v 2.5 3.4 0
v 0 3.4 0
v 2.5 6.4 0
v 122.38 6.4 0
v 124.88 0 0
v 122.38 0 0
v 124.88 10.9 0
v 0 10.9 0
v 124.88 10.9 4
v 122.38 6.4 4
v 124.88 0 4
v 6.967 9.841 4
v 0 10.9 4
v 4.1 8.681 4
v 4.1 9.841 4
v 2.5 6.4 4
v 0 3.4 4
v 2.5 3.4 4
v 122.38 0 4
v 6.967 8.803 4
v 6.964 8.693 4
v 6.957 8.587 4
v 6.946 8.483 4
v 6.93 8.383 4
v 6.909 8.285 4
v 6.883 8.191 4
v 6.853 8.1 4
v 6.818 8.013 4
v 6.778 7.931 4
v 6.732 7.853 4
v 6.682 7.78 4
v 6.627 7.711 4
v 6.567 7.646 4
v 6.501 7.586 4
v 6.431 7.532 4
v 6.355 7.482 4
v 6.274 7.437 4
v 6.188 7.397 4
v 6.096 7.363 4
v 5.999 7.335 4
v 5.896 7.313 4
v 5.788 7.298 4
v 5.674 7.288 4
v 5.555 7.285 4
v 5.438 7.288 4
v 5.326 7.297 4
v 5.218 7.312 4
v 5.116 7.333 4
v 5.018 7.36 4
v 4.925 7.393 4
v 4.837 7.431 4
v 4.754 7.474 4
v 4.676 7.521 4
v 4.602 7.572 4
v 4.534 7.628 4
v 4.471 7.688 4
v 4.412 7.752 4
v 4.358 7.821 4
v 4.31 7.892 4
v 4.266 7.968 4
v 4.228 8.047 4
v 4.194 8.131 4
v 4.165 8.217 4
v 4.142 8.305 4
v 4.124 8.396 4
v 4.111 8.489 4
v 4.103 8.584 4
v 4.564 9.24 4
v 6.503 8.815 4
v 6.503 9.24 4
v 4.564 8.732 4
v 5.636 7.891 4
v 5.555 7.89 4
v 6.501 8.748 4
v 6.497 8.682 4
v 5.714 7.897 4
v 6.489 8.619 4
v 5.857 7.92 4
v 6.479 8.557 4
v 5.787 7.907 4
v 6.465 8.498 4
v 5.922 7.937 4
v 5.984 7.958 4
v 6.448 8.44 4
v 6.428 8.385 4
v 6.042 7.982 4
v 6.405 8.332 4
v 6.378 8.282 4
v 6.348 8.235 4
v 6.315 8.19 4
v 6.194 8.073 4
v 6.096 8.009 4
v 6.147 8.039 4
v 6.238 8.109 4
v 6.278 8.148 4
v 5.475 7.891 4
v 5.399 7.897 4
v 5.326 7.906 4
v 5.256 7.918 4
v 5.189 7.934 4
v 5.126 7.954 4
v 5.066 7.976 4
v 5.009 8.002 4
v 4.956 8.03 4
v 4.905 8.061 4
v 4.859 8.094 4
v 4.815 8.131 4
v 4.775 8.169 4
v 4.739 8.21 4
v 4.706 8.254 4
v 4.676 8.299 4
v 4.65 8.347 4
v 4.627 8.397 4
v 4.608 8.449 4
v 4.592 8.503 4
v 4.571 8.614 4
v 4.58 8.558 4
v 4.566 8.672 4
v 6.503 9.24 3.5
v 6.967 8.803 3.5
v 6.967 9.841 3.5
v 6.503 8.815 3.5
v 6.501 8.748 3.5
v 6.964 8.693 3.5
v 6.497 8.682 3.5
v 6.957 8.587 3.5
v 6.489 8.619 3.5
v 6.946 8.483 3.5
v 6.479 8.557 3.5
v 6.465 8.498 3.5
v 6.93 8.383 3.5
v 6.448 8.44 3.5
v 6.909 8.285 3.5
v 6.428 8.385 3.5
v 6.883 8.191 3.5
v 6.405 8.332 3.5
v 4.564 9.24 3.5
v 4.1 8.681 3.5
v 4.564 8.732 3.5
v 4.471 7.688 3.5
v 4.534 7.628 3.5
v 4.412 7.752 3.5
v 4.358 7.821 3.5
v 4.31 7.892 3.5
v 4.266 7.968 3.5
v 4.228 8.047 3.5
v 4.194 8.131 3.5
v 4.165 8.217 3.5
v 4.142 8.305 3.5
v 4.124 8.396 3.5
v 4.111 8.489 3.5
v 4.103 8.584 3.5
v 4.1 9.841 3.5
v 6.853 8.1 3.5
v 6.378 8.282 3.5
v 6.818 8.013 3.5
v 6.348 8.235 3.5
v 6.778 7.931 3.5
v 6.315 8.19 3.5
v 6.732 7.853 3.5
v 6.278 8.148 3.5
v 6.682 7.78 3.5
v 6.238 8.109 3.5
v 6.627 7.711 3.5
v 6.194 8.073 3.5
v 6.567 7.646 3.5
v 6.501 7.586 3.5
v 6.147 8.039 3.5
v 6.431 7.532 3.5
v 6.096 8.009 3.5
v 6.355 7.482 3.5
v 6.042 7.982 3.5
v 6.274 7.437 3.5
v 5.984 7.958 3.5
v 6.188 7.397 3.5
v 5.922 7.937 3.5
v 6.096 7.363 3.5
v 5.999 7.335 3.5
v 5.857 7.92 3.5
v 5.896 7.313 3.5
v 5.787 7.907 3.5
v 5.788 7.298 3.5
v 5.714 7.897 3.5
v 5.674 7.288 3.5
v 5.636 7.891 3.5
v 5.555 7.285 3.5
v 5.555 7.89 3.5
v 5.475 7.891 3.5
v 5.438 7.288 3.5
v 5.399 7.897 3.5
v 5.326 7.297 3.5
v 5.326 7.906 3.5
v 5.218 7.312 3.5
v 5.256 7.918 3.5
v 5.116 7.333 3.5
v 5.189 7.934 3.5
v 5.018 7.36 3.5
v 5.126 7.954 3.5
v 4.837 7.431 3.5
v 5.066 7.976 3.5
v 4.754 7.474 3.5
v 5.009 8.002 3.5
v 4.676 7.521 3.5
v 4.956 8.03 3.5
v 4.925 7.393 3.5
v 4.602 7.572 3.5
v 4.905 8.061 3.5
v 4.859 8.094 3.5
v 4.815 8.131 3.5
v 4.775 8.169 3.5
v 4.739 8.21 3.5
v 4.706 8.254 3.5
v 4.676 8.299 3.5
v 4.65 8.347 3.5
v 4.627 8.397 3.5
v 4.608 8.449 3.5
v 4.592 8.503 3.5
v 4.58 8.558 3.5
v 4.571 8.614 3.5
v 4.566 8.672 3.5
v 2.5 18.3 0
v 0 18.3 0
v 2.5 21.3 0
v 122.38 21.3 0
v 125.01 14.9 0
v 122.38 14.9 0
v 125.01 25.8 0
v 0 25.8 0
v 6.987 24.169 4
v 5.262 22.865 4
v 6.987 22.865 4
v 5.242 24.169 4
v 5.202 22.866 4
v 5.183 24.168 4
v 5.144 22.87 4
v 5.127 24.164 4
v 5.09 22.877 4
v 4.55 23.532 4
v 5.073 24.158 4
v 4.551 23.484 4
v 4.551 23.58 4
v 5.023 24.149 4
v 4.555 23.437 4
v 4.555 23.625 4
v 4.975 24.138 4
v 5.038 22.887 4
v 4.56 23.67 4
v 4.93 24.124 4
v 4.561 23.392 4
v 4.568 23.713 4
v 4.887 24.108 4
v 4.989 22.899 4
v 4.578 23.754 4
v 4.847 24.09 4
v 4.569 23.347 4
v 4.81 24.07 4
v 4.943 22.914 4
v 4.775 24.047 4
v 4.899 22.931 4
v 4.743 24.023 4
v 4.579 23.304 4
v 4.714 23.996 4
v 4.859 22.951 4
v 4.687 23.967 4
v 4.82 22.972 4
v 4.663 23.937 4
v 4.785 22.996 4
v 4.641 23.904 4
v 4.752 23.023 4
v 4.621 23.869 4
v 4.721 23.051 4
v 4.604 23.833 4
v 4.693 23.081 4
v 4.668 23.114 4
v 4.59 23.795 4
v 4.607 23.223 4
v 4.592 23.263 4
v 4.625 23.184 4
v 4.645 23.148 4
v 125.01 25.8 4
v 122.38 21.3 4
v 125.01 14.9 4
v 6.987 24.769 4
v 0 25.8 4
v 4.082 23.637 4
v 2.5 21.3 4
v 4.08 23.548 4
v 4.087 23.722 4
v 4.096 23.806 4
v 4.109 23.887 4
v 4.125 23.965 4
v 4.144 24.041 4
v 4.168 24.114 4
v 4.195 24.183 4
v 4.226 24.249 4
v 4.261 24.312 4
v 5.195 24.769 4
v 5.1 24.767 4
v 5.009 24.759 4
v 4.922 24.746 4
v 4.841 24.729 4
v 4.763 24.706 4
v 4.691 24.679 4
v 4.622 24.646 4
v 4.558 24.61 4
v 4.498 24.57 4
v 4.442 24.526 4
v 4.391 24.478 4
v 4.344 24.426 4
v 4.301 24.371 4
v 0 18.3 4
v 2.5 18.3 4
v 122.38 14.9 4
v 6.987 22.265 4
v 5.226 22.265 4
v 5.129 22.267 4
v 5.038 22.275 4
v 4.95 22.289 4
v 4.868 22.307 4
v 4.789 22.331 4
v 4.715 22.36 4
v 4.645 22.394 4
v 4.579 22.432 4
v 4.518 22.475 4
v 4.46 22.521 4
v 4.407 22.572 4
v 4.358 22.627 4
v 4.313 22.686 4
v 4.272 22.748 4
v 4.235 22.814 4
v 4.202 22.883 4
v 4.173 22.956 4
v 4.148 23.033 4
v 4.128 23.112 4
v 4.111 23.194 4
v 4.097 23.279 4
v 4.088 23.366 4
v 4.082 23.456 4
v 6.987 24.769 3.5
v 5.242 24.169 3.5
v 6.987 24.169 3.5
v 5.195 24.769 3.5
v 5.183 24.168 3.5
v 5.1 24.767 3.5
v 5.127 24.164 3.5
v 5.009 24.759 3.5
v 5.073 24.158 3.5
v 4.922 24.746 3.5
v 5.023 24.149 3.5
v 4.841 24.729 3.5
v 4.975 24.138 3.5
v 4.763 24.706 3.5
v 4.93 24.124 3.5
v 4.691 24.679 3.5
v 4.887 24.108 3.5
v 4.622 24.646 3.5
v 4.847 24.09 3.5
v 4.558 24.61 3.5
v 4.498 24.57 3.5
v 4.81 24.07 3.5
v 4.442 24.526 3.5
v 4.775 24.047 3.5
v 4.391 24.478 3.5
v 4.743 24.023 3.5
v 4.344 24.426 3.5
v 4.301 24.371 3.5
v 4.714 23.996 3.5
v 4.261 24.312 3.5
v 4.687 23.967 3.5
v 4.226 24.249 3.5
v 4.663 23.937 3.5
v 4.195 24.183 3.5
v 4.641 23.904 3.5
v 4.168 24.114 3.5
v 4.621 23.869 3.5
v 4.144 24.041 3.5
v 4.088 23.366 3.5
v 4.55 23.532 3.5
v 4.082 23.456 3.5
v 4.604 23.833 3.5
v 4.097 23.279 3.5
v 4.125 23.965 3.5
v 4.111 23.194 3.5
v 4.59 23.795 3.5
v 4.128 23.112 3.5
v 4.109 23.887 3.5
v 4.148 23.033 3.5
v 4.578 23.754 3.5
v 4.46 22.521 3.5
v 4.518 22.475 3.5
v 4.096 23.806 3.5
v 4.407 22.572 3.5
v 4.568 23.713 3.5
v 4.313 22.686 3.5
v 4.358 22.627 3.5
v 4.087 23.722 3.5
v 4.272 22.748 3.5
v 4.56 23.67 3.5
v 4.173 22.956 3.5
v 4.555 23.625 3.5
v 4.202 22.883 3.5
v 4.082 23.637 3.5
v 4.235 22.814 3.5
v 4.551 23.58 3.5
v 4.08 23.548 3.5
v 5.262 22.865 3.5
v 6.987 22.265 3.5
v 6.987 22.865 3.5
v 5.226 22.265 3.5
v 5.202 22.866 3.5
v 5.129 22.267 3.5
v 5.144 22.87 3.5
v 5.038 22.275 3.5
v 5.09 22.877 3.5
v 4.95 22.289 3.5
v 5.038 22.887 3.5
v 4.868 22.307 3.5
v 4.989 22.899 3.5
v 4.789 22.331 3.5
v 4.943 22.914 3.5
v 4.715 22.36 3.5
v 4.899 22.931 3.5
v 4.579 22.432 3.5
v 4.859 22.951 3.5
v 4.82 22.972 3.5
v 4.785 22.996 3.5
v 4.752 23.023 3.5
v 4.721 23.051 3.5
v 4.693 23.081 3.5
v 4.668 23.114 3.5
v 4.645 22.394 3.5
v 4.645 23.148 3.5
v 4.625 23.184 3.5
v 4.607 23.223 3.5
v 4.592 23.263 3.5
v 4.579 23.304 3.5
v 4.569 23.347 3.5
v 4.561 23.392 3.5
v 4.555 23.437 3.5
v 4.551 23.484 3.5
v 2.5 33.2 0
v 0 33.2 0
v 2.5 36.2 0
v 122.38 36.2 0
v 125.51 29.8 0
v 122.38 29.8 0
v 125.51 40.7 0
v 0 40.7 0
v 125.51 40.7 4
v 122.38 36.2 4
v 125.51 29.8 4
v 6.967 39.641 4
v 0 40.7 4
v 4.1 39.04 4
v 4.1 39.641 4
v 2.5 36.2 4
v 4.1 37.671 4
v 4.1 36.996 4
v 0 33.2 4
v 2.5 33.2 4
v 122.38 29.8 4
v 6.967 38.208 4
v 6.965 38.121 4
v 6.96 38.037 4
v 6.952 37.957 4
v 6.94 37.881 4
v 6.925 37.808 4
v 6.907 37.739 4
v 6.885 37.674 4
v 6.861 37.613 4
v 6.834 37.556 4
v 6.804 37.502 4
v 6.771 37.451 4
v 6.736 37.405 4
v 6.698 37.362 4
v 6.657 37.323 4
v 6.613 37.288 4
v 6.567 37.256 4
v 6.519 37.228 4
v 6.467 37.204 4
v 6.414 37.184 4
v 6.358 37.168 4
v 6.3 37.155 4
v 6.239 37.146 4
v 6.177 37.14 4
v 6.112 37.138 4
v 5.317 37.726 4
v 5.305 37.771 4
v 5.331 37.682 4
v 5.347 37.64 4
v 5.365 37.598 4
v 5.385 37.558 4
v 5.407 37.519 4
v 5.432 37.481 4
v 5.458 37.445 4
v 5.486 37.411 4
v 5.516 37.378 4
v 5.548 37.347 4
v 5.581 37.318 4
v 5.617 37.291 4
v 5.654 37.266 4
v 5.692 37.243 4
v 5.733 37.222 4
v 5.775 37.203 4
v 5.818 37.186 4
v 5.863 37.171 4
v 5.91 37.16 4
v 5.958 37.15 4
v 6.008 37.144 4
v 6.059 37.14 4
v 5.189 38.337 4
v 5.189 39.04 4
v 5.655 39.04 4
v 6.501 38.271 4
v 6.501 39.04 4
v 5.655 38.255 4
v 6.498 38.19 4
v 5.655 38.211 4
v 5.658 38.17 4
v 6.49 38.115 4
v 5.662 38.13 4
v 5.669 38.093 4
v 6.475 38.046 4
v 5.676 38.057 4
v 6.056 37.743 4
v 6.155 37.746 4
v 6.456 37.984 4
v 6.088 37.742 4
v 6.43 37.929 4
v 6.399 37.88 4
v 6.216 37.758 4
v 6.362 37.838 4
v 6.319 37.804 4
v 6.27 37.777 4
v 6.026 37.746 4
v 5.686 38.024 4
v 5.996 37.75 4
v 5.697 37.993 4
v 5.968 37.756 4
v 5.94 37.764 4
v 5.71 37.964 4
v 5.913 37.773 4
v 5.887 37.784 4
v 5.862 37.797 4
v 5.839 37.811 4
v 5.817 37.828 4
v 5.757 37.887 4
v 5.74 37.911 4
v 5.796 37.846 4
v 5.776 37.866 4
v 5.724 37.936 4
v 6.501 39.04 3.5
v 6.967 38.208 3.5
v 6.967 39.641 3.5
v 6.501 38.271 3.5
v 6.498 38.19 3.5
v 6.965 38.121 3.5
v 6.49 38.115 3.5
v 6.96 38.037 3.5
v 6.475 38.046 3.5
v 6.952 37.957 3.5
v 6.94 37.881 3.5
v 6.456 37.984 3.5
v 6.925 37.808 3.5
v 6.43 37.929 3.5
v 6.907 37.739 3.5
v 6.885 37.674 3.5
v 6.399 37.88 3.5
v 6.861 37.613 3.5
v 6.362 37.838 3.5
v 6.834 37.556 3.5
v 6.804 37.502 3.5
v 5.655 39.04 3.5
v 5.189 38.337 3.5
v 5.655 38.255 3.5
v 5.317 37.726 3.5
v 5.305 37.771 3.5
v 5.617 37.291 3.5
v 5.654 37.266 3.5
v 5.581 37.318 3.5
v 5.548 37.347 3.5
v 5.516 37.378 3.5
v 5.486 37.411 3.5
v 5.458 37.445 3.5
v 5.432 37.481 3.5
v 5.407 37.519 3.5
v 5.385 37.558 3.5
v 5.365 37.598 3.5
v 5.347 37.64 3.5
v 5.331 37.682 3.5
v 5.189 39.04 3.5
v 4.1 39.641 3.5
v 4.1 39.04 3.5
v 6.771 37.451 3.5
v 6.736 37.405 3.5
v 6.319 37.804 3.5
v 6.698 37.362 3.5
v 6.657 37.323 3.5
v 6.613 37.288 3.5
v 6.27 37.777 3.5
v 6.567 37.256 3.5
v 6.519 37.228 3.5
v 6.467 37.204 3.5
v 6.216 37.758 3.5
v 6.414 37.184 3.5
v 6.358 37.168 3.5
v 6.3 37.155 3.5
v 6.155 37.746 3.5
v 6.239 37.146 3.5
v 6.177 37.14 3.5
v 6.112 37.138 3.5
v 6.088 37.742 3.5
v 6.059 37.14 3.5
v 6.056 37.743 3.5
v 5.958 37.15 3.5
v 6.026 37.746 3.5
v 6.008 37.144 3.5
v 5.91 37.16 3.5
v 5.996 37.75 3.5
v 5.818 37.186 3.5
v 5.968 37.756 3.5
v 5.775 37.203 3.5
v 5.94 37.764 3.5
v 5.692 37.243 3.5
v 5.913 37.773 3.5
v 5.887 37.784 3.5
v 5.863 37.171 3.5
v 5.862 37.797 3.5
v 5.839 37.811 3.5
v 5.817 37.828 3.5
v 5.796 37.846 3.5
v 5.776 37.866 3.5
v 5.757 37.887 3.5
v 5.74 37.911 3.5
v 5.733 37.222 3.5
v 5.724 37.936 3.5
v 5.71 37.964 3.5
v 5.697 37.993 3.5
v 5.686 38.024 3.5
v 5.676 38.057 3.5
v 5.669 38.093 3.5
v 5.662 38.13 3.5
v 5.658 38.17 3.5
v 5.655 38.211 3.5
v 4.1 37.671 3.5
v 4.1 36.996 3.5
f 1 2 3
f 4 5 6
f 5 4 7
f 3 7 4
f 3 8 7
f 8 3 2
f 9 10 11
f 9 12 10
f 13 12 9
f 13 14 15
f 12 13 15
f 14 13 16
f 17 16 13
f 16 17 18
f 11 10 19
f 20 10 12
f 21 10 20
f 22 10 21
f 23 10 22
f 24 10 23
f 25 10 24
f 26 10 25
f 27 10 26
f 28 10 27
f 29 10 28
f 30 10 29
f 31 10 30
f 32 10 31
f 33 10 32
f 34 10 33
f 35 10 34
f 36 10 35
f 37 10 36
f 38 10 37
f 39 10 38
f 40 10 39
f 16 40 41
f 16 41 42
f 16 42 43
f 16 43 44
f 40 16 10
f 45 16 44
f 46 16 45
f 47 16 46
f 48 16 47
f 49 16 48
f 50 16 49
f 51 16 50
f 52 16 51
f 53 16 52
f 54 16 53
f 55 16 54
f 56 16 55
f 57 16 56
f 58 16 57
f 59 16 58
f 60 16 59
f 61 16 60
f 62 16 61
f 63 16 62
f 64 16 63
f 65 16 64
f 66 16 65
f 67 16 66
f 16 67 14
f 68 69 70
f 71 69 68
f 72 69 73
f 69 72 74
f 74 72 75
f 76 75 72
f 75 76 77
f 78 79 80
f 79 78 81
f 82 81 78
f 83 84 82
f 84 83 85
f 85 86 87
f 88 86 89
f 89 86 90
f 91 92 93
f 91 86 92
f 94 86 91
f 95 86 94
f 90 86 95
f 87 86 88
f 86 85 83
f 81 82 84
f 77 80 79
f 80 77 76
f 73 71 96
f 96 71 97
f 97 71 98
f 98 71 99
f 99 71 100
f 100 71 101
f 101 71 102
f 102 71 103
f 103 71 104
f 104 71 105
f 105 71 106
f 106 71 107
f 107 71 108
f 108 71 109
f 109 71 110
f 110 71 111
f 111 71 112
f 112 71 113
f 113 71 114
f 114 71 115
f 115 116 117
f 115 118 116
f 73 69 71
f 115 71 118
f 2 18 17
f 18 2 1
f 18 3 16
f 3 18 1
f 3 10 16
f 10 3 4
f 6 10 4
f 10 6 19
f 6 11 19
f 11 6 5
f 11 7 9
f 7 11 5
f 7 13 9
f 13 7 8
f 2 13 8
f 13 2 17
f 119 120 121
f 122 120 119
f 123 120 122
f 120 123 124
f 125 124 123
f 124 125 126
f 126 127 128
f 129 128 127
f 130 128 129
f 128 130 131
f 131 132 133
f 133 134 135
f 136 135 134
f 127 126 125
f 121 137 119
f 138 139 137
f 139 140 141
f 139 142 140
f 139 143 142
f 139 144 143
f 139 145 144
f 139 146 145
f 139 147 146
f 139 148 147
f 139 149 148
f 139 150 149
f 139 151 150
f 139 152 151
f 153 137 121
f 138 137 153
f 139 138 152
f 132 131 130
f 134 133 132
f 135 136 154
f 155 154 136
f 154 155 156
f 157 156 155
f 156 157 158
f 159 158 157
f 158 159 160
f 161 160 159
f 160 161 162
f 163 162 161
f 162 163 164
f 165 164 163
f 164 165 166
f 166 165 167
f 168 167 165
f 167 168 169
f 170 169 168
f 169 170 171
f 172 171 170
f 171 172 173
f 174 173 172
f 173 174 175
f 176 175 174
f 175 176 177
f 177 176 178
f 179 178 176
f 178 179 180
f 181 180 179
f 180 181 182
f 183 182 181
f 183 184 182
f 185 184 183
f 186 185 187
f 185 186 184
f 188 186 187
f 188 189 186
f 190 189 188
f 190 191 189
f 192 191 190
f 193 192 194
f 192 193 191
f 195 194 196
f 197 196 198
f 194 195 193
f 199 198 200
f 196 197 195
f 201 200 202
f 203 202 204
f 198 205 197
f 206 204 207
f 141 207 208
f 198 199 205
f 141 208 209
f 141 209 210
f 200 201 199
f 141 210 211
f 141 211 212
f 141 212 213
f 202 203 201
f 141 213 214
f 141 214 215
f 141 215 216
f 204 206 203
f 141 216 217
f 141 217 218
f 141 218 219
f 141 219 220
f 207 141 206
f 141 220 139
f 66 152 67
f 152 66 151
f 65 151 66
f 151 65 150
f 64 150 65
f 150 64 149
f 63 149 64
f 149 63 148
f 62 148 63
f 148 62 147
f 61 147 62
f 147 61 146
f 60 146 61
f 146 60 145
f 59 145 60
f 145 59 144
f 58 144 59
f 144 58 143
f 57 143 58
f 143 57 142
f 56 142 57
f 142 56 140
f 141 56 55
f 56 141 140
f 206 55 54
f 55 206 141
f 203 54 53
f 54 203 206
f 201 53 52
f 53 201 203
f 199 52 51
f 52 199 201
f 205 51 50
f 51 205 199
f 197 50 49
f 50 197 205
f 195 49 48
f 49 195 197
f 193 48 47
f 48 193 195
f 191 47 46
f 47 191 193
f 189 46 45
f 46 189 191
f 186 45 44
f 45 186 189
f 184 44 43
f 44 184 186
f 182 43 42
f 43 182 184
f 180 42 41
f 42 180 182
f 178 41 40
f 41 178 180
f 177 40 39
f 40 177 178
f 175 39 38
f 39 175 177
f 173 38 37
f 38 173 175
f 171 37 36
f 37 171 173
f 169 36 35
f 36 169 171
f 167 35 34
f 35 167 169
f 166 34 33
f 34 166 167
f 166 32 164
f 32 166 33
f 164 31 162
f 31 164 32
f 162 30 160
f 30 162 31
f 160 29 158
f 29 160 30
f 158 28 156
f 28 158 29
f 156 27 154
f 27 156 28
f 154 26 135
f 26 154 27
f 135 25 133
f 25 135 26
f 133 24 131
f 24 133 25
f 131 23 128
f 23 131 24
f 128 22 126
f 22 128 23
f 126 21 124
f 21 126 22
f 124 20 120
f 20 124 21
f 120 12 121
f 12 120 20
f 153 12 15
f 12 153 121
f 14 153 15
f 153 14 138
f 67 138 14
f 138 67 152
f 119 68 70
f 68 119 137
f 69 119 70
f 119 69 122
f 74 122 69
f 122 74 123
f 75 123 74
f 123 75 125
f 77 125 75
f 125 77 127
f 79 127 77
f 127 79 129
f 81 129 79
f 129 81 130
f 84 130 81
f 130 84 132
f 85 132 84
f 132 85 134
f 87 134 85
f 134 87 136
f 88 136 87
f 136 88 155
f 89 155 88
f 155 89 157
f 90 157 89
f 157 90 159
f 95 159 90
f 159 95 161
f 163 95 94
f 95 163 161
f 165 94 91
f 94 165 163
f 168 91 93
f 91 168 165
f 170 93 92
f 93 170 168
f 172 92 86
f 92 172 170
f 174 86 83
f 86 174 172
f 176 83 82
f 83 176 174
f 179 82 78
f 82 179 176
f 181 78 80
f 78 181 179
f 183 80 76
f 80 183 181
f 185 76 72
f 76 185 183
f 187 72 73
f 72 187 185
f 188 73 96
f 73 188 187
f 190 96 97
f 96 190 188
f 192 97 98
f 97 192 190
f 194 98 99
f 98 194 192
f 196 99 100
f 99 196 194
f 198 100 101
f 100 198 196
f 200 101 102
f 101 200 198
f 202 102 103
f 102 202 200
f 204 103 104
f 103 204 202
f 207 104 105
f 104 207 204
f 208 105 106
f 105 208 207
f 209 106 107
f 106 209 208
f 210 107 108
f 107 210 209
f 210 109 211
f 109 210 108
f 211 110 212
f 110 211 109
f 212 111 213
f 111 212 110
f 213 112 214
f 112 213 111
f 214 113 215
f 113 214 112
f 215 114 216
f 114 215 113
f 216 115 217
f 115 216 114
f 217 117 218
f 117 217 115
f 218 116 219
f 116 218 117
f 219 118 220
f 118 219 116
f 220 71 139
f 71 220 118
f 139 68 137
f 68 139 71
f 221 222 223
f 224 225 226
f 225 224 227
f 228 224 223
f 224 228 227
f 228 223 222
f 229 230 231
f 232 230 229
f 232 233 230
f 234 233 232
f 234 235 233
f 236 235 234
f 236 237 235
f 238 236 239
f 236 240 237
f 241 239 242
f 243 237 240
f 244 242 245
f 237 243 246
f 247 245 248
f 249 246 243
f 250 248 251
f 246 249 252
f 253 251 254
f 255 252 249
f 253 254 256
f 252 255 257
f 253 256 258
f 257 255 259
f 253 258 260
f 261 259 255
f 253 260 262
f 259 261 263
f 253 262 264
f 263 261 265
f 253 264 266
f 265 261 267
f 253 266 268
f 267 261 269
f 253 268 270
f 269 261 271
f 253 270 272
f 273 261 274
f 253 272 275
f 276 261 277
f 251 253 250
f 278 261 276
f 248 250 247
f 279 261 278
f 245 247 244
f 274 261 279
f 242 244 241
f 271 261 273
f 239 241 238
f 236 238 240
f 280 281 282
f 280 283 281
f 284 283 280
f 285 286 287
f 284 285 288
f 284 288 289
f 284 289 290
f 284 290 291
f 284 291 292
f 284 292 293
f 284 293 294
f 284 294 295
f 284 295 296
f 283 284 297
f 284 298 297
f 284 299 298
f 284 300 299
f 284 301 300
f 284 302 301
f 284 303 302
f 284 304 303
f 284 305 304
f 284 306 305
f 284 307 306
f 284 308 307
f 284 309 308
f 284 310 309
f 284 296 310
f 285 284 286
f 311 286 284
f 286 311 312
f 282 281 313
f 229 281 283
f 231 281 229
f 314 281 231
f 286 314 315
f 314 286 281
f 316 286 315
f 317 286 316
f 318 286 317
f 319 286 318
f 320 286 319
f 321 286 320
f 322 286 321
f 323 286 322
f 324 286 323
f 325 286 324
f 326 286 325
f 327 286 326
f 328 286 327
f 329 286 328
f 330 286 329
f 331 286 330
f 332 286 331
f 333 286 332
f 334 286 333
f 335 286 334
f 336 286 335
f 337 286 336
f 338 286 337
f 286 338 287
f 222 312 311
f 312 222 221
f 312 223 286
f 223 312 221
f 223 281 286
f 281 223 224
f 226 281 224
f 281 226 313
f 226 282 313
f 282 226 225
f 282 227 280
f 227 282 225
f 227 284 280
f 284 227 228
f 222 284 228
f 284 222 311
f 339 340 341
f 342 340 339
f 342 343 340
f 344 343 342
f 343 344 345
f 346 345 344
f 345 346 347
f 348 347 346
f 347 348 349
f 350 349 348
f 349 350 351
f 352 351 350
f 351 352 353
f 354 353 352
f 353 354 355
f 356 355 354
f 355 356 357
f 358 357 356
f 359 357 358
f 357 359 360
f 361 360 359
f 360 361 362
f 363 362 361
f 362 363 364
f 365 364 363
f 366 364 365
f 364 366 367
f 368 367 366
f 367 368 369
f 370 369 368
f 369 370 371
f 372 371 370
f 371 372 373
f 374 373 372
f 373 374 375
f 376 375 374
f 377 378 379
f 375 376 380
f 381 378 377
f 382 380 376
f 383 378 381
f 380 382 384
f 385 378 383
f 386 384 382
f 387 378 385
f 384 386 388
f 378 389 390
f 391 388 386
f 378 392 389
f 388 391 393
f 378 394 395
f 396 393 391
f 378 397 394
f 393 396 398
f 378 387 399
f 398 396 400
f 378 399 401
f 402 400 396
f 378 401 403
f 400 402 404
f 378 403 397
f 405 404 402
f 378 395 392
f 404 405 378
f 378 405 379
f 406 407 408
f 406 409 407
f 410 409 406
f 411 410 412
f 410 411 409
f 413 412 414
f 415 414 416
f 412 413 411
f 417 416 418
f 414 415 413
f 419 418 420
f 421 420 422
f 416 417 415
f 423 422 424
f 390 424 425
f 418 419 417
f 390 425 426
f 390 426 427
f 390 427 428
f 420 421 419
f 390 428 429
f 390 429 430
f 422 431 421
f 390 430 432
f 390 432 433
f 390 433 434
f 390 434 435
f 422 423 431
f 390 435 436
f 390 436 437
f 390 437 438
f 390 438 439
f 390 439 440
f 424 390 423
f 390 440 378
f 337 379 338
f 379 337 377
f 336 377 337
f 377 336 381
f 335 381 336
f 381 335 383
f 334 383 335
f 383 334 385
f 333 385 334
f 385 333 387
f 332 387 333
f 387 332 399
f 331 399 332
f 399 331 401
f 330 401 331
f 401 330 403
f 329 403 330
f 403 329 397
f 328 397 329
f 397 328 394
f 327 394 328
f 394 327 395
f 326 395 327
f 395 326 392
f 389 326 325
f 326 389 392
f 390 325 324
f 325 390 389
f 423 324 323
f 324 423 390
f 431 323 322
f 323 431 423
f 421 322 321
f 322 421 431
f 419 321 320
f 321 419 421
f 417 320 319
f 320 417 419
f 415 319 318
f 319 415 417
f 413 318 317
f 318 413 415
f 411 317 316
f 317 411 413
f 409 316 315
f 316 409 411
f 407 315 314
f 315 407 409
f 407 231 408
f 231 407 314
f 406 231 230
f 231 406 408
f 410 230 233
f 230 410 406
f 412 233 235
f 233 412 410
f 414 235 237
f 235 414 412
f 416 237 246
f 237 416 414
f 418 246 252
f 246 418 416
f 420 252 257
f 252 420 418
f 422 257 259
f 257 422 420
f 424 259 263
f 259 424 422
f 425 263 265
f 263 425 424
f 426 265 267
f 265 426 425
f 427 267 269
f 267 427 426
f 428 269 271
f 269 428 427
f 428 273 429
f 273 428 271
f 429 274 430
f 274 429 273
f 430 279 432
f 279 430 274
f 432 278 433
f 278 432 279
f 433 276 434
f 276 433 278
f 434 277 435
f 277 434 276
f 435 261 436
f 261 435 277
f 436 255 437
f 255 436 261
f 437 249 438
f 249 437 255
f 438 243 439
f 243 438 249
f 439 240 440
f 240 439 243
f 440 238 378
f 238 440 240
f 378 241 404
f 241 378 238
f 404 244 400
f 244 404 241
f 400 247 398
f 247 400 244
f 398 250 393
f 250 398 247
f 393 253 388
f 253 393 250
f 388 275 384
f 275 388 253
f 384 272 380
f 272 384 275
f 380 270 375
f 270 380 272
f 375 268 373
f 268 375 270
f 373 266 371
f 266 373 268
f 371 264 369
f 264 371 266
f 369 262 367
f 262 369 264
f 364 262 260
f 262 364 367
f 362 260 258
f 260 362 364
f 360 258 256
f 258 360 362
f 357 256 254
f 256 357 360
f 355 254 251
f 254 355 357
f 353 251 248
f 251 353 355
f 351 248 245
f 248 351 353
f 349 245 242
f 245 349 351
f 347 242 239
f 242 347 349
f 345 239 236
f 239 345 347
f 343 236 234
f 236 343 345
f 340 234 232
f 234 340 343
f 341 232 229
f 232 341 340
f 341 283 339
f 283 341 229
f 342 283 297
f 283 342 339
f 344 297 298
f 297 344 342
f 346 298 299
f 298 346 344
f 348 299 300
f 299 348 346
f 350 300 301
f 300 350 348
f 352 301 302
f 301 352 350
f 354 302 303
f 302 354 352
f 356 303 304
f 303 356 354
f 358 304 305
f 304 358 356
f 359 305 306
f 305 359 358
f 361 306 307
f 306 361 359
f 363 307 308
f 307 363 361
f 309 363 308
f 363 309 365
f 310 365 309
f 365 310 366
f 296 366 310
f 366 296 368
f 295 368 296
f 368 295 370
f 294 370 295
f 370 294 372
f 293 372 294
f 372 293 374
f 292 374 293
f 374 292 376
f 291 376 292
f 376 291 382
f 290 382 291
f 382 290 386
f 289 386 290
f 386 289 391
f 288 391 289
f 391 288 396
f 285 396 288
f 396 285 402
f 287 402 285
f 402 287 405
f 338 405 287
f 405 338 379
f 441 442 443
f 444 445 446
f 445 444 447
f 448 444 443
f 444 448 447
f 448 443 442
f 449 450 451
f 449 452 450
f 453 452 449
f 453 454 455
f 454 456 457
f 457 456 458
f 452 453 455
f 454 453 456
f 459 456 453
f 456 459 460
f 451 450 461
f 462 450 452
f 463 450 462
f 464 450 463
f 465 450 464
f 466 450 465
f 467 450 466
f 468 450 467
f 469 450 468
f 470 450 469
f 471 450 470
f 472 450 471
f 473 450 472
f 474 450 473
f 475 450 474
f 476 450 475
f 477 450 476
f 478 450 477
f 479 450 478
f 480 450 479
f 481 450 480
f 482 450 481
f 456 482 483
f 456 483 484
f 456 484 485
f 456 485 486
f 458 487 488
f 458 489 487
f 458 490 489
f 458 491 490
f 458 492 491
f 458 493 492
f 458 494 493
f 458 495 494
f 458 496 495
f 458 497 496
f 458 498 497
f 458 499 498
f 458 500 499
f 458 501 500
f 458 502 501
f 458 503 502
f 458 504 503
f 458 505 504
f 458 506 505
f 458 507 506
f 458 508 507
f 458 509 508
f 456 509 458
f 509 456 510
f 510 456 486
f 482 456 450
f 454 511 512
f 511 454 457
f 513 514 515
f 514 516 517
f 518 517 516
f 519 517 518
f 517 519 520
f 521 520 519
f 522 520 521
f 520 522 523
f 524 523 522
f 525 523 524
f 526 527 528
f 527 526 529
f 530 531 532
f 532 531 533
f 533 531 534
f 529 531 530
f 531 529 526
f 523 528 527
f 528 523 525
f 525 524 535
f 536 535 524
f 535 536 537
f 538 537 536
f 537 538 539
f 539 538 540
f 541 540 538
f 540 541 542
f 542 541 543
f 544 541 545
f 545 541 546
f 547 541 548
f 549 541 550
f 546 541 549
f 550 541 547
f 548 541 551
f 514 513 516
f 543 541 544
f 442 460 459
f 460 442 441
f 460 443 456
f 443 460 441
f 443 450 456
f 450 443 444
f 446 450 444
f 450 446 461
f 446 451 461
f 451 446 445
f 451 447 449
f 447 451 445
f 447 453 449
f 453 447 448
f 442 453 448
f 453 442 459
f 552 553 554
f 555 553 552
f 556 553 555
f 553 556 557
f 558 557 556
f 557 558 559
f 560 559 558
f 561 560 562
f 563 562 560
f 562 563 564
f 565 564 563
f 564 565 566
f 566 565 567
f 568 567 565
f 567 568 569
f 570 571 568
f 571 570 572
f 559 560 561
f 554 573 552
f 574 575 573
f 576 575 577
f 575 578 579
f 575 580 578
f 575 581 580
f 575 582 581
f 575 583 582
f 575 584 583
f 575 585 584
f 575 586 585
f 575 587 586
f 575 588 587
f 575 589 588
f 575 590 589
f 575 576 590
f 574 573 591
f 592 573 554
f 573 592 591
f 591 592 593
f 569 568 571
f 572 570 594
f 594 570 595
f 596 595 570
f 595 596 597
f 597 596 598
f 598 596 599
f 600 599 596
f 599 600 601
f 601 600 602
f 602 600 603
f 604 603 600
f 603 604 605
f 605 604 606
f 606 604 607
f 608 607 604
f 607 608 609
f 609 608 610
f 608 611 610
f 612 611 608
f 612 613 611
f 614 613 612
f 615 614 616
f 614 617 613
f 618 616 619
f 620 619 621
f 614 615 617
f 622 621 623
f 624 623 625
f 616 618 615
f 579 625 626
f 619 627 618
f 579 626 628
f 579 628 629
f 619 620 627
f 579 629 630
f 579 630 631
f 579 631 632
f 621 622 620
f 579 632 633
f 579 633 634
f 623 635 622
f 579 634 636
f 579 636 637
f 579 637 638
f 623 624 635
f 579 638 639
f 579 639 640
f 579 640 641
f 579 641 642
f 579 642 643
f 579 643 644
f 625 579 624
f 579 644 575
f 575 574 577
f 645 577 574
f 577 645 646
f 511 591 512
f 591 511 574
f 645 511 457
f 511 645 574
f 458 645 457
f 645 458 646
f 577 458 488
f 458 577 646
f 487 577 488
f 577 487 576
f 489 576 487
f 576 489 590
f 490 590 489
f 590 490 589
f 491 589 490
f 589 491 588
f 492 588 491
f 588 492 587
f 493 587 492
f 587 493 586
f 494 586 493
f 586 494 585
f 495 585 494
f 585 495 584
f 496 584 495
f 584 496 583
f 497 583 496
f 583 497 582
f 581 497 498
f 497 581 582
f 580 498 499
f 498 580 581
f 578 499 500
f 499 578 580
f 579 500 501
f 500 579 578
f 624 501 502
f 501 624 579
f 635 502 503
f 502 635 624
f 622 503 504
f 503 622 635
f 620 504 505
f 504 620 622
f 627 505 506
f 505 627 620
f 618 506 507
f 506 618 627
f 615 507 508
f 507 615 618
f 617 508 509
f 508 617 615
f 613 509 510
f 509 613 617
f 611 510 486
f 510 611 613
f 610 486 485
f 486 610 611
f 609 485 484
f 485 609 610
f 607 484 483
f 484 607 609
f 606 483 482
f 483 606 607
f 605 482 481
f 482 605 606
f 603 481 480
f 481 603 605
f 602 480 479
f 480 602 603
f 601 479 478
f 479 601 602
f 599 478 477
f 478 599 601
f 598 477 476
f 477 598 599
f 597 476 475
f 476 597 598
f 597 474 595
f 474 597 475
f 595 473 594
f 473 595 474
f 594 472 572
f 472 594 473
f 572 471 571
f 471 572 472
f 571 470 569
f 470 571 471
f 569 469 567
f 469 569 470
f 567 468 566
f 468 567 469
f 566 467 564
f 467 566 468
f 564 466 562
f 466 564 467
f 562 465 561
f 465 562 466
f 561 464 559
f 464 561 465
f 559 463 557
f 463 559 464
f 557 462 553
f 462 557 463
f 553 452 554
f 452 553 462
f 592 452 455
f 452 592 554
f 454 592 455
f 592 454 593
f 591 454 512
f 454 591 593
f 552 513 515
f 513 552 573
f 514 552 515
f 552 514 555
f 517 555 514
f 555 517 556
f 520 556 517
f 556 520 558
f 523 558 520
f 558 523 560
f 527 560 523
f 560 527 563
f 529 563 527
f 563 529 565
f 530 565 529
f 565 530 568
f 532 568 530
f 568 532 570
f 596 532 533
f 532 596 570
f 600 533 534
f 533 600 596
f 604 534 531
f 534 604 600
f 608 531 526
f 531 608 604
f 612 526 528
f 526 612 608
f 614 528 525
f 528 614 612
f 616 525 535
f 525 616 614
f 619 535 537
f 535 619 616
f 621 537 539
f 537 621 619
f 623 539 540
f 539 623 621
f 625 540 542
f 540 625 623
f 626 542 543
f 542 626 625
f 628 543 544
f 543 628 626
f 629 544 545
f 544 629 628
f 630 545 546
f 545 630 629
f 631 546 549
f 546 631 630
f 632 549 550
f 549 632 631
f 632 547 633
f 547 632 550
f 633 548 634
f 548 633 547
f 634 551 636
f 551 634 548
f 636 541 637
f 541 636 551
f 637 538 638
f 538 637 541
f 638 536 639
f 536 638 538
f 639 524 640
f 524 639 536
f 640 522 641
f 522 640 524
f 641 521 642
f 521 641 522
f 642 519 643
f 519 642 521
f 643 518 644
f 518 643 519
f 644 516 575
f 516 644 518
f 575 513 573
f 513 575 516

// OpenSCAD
// TailWatch S3 enclosure -- button_rods
// Button push-rods (DN, UP, RST). Lying flat as exported.
// Exported in print orientation; no supports needed.
include <tailwatch_lib.scad>
run_checks();
rods_print();
